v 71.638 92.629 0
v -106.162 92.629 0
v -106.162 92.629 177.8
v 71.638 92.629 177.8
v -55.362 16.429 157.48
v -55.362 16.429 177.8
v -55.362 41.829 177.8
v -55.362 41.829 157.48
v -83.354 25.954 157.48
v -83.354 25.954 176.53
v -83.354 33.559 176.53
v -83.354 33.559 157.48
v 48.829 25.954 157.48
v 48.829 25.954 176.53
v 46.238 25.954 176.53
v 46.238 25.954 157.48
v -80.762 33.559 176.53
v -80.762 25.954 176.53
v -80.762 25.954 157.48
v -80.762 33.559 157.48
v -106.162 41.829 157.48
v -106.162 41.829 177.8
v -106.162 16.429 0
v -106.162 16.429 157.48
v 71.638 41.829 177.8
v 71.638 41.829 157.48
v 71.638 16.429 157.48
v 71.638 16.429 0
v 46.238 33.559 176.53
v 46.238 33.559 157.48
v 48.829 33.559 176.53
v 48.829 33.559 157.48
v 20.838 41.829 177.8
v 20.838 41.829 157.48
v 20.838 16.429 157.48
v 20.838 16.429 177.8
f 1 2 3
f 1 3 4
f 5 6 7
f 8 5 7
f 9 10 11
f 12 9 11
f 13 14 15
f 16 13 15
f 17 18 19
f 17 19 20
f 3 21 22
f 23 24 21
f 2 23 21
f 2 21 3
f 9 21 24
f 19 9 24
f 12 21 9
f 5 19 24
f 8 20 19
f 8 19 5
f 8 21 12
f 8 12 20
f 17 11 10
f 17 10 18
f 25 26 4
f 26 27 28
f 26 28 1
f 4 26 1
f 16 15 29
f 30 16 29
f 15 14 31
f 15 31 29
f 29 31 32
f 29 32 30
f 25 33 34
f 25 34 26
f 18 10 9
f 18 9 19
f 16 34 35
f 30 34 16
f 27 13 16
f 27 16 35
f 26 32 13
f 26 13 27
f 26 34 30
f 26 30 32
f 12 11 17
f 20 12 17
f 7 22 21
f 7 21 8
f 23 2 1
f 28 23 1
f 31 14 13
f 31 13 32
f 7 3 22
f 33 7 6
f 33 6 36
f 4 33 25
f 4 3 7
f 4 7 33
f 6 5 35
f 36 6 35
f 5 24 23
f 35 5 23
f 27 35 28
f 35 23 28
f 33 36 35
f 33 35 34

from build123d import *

# Parameters (mm, degrees)
F0_W     = 177.8
F0_H     = 76.2
F1_DEPTH = 177.8
F2_W     = 50.8
F2_H     = 25.4
F3_DEPTH = 20.32
F4_W     = 2.5917394697
F4_H     = 7.6049772211
F5_DEPTH = 19.05


# Not quite as in the source:
# - a length typed as a fraction of an inch, garbled in the dataset ("3 / 203.2 mm" for 3/8 in), is restored


with BuildPart() as f1:
    # F0 (on Top) → F1 (new body)
    with BuildSketch(Plane.XY):
        with Locations((-17.2624356211, 54.5294494442)):
            Rectangle(F0_W, F0_H)
    extrude(amount=F1_DEPTH)

    # F2 (on face) → F3 (cut)
    with BuildSketch(Plane.XY.offset(177.8)):
        with Locations((-80.7624356211, 29.1294494442)):
            Rectangle(F2_W, F2_H)
        with Locations((46.2375643789, 29.1294494442)):
            Rectangle(F2_W, F2_H)
    extrude(amount=-F3_DEPTH, mode=Mode.SUBTRACT)

    # F4 (on face) → F5 (join)
    with BuildSketch(Plane.XY.offset(157.48)):
        with Locations((-82.0583053559, 29.7569380547)):
            Rectangle(F4_W, F4_H)
    extrude(amount=F5_DEPTH)

    # F7: F1 across plane


with BuildPart() as f1_1:
    add(f1.part)
    add(f1.part.mirror(Plane(origin=(-17.2624356211, 55.5353900382, 85.7815841584), x_dir=(0, -1, 0), z_dir=(-1, 0, 0))))


solid = f1_1.part
